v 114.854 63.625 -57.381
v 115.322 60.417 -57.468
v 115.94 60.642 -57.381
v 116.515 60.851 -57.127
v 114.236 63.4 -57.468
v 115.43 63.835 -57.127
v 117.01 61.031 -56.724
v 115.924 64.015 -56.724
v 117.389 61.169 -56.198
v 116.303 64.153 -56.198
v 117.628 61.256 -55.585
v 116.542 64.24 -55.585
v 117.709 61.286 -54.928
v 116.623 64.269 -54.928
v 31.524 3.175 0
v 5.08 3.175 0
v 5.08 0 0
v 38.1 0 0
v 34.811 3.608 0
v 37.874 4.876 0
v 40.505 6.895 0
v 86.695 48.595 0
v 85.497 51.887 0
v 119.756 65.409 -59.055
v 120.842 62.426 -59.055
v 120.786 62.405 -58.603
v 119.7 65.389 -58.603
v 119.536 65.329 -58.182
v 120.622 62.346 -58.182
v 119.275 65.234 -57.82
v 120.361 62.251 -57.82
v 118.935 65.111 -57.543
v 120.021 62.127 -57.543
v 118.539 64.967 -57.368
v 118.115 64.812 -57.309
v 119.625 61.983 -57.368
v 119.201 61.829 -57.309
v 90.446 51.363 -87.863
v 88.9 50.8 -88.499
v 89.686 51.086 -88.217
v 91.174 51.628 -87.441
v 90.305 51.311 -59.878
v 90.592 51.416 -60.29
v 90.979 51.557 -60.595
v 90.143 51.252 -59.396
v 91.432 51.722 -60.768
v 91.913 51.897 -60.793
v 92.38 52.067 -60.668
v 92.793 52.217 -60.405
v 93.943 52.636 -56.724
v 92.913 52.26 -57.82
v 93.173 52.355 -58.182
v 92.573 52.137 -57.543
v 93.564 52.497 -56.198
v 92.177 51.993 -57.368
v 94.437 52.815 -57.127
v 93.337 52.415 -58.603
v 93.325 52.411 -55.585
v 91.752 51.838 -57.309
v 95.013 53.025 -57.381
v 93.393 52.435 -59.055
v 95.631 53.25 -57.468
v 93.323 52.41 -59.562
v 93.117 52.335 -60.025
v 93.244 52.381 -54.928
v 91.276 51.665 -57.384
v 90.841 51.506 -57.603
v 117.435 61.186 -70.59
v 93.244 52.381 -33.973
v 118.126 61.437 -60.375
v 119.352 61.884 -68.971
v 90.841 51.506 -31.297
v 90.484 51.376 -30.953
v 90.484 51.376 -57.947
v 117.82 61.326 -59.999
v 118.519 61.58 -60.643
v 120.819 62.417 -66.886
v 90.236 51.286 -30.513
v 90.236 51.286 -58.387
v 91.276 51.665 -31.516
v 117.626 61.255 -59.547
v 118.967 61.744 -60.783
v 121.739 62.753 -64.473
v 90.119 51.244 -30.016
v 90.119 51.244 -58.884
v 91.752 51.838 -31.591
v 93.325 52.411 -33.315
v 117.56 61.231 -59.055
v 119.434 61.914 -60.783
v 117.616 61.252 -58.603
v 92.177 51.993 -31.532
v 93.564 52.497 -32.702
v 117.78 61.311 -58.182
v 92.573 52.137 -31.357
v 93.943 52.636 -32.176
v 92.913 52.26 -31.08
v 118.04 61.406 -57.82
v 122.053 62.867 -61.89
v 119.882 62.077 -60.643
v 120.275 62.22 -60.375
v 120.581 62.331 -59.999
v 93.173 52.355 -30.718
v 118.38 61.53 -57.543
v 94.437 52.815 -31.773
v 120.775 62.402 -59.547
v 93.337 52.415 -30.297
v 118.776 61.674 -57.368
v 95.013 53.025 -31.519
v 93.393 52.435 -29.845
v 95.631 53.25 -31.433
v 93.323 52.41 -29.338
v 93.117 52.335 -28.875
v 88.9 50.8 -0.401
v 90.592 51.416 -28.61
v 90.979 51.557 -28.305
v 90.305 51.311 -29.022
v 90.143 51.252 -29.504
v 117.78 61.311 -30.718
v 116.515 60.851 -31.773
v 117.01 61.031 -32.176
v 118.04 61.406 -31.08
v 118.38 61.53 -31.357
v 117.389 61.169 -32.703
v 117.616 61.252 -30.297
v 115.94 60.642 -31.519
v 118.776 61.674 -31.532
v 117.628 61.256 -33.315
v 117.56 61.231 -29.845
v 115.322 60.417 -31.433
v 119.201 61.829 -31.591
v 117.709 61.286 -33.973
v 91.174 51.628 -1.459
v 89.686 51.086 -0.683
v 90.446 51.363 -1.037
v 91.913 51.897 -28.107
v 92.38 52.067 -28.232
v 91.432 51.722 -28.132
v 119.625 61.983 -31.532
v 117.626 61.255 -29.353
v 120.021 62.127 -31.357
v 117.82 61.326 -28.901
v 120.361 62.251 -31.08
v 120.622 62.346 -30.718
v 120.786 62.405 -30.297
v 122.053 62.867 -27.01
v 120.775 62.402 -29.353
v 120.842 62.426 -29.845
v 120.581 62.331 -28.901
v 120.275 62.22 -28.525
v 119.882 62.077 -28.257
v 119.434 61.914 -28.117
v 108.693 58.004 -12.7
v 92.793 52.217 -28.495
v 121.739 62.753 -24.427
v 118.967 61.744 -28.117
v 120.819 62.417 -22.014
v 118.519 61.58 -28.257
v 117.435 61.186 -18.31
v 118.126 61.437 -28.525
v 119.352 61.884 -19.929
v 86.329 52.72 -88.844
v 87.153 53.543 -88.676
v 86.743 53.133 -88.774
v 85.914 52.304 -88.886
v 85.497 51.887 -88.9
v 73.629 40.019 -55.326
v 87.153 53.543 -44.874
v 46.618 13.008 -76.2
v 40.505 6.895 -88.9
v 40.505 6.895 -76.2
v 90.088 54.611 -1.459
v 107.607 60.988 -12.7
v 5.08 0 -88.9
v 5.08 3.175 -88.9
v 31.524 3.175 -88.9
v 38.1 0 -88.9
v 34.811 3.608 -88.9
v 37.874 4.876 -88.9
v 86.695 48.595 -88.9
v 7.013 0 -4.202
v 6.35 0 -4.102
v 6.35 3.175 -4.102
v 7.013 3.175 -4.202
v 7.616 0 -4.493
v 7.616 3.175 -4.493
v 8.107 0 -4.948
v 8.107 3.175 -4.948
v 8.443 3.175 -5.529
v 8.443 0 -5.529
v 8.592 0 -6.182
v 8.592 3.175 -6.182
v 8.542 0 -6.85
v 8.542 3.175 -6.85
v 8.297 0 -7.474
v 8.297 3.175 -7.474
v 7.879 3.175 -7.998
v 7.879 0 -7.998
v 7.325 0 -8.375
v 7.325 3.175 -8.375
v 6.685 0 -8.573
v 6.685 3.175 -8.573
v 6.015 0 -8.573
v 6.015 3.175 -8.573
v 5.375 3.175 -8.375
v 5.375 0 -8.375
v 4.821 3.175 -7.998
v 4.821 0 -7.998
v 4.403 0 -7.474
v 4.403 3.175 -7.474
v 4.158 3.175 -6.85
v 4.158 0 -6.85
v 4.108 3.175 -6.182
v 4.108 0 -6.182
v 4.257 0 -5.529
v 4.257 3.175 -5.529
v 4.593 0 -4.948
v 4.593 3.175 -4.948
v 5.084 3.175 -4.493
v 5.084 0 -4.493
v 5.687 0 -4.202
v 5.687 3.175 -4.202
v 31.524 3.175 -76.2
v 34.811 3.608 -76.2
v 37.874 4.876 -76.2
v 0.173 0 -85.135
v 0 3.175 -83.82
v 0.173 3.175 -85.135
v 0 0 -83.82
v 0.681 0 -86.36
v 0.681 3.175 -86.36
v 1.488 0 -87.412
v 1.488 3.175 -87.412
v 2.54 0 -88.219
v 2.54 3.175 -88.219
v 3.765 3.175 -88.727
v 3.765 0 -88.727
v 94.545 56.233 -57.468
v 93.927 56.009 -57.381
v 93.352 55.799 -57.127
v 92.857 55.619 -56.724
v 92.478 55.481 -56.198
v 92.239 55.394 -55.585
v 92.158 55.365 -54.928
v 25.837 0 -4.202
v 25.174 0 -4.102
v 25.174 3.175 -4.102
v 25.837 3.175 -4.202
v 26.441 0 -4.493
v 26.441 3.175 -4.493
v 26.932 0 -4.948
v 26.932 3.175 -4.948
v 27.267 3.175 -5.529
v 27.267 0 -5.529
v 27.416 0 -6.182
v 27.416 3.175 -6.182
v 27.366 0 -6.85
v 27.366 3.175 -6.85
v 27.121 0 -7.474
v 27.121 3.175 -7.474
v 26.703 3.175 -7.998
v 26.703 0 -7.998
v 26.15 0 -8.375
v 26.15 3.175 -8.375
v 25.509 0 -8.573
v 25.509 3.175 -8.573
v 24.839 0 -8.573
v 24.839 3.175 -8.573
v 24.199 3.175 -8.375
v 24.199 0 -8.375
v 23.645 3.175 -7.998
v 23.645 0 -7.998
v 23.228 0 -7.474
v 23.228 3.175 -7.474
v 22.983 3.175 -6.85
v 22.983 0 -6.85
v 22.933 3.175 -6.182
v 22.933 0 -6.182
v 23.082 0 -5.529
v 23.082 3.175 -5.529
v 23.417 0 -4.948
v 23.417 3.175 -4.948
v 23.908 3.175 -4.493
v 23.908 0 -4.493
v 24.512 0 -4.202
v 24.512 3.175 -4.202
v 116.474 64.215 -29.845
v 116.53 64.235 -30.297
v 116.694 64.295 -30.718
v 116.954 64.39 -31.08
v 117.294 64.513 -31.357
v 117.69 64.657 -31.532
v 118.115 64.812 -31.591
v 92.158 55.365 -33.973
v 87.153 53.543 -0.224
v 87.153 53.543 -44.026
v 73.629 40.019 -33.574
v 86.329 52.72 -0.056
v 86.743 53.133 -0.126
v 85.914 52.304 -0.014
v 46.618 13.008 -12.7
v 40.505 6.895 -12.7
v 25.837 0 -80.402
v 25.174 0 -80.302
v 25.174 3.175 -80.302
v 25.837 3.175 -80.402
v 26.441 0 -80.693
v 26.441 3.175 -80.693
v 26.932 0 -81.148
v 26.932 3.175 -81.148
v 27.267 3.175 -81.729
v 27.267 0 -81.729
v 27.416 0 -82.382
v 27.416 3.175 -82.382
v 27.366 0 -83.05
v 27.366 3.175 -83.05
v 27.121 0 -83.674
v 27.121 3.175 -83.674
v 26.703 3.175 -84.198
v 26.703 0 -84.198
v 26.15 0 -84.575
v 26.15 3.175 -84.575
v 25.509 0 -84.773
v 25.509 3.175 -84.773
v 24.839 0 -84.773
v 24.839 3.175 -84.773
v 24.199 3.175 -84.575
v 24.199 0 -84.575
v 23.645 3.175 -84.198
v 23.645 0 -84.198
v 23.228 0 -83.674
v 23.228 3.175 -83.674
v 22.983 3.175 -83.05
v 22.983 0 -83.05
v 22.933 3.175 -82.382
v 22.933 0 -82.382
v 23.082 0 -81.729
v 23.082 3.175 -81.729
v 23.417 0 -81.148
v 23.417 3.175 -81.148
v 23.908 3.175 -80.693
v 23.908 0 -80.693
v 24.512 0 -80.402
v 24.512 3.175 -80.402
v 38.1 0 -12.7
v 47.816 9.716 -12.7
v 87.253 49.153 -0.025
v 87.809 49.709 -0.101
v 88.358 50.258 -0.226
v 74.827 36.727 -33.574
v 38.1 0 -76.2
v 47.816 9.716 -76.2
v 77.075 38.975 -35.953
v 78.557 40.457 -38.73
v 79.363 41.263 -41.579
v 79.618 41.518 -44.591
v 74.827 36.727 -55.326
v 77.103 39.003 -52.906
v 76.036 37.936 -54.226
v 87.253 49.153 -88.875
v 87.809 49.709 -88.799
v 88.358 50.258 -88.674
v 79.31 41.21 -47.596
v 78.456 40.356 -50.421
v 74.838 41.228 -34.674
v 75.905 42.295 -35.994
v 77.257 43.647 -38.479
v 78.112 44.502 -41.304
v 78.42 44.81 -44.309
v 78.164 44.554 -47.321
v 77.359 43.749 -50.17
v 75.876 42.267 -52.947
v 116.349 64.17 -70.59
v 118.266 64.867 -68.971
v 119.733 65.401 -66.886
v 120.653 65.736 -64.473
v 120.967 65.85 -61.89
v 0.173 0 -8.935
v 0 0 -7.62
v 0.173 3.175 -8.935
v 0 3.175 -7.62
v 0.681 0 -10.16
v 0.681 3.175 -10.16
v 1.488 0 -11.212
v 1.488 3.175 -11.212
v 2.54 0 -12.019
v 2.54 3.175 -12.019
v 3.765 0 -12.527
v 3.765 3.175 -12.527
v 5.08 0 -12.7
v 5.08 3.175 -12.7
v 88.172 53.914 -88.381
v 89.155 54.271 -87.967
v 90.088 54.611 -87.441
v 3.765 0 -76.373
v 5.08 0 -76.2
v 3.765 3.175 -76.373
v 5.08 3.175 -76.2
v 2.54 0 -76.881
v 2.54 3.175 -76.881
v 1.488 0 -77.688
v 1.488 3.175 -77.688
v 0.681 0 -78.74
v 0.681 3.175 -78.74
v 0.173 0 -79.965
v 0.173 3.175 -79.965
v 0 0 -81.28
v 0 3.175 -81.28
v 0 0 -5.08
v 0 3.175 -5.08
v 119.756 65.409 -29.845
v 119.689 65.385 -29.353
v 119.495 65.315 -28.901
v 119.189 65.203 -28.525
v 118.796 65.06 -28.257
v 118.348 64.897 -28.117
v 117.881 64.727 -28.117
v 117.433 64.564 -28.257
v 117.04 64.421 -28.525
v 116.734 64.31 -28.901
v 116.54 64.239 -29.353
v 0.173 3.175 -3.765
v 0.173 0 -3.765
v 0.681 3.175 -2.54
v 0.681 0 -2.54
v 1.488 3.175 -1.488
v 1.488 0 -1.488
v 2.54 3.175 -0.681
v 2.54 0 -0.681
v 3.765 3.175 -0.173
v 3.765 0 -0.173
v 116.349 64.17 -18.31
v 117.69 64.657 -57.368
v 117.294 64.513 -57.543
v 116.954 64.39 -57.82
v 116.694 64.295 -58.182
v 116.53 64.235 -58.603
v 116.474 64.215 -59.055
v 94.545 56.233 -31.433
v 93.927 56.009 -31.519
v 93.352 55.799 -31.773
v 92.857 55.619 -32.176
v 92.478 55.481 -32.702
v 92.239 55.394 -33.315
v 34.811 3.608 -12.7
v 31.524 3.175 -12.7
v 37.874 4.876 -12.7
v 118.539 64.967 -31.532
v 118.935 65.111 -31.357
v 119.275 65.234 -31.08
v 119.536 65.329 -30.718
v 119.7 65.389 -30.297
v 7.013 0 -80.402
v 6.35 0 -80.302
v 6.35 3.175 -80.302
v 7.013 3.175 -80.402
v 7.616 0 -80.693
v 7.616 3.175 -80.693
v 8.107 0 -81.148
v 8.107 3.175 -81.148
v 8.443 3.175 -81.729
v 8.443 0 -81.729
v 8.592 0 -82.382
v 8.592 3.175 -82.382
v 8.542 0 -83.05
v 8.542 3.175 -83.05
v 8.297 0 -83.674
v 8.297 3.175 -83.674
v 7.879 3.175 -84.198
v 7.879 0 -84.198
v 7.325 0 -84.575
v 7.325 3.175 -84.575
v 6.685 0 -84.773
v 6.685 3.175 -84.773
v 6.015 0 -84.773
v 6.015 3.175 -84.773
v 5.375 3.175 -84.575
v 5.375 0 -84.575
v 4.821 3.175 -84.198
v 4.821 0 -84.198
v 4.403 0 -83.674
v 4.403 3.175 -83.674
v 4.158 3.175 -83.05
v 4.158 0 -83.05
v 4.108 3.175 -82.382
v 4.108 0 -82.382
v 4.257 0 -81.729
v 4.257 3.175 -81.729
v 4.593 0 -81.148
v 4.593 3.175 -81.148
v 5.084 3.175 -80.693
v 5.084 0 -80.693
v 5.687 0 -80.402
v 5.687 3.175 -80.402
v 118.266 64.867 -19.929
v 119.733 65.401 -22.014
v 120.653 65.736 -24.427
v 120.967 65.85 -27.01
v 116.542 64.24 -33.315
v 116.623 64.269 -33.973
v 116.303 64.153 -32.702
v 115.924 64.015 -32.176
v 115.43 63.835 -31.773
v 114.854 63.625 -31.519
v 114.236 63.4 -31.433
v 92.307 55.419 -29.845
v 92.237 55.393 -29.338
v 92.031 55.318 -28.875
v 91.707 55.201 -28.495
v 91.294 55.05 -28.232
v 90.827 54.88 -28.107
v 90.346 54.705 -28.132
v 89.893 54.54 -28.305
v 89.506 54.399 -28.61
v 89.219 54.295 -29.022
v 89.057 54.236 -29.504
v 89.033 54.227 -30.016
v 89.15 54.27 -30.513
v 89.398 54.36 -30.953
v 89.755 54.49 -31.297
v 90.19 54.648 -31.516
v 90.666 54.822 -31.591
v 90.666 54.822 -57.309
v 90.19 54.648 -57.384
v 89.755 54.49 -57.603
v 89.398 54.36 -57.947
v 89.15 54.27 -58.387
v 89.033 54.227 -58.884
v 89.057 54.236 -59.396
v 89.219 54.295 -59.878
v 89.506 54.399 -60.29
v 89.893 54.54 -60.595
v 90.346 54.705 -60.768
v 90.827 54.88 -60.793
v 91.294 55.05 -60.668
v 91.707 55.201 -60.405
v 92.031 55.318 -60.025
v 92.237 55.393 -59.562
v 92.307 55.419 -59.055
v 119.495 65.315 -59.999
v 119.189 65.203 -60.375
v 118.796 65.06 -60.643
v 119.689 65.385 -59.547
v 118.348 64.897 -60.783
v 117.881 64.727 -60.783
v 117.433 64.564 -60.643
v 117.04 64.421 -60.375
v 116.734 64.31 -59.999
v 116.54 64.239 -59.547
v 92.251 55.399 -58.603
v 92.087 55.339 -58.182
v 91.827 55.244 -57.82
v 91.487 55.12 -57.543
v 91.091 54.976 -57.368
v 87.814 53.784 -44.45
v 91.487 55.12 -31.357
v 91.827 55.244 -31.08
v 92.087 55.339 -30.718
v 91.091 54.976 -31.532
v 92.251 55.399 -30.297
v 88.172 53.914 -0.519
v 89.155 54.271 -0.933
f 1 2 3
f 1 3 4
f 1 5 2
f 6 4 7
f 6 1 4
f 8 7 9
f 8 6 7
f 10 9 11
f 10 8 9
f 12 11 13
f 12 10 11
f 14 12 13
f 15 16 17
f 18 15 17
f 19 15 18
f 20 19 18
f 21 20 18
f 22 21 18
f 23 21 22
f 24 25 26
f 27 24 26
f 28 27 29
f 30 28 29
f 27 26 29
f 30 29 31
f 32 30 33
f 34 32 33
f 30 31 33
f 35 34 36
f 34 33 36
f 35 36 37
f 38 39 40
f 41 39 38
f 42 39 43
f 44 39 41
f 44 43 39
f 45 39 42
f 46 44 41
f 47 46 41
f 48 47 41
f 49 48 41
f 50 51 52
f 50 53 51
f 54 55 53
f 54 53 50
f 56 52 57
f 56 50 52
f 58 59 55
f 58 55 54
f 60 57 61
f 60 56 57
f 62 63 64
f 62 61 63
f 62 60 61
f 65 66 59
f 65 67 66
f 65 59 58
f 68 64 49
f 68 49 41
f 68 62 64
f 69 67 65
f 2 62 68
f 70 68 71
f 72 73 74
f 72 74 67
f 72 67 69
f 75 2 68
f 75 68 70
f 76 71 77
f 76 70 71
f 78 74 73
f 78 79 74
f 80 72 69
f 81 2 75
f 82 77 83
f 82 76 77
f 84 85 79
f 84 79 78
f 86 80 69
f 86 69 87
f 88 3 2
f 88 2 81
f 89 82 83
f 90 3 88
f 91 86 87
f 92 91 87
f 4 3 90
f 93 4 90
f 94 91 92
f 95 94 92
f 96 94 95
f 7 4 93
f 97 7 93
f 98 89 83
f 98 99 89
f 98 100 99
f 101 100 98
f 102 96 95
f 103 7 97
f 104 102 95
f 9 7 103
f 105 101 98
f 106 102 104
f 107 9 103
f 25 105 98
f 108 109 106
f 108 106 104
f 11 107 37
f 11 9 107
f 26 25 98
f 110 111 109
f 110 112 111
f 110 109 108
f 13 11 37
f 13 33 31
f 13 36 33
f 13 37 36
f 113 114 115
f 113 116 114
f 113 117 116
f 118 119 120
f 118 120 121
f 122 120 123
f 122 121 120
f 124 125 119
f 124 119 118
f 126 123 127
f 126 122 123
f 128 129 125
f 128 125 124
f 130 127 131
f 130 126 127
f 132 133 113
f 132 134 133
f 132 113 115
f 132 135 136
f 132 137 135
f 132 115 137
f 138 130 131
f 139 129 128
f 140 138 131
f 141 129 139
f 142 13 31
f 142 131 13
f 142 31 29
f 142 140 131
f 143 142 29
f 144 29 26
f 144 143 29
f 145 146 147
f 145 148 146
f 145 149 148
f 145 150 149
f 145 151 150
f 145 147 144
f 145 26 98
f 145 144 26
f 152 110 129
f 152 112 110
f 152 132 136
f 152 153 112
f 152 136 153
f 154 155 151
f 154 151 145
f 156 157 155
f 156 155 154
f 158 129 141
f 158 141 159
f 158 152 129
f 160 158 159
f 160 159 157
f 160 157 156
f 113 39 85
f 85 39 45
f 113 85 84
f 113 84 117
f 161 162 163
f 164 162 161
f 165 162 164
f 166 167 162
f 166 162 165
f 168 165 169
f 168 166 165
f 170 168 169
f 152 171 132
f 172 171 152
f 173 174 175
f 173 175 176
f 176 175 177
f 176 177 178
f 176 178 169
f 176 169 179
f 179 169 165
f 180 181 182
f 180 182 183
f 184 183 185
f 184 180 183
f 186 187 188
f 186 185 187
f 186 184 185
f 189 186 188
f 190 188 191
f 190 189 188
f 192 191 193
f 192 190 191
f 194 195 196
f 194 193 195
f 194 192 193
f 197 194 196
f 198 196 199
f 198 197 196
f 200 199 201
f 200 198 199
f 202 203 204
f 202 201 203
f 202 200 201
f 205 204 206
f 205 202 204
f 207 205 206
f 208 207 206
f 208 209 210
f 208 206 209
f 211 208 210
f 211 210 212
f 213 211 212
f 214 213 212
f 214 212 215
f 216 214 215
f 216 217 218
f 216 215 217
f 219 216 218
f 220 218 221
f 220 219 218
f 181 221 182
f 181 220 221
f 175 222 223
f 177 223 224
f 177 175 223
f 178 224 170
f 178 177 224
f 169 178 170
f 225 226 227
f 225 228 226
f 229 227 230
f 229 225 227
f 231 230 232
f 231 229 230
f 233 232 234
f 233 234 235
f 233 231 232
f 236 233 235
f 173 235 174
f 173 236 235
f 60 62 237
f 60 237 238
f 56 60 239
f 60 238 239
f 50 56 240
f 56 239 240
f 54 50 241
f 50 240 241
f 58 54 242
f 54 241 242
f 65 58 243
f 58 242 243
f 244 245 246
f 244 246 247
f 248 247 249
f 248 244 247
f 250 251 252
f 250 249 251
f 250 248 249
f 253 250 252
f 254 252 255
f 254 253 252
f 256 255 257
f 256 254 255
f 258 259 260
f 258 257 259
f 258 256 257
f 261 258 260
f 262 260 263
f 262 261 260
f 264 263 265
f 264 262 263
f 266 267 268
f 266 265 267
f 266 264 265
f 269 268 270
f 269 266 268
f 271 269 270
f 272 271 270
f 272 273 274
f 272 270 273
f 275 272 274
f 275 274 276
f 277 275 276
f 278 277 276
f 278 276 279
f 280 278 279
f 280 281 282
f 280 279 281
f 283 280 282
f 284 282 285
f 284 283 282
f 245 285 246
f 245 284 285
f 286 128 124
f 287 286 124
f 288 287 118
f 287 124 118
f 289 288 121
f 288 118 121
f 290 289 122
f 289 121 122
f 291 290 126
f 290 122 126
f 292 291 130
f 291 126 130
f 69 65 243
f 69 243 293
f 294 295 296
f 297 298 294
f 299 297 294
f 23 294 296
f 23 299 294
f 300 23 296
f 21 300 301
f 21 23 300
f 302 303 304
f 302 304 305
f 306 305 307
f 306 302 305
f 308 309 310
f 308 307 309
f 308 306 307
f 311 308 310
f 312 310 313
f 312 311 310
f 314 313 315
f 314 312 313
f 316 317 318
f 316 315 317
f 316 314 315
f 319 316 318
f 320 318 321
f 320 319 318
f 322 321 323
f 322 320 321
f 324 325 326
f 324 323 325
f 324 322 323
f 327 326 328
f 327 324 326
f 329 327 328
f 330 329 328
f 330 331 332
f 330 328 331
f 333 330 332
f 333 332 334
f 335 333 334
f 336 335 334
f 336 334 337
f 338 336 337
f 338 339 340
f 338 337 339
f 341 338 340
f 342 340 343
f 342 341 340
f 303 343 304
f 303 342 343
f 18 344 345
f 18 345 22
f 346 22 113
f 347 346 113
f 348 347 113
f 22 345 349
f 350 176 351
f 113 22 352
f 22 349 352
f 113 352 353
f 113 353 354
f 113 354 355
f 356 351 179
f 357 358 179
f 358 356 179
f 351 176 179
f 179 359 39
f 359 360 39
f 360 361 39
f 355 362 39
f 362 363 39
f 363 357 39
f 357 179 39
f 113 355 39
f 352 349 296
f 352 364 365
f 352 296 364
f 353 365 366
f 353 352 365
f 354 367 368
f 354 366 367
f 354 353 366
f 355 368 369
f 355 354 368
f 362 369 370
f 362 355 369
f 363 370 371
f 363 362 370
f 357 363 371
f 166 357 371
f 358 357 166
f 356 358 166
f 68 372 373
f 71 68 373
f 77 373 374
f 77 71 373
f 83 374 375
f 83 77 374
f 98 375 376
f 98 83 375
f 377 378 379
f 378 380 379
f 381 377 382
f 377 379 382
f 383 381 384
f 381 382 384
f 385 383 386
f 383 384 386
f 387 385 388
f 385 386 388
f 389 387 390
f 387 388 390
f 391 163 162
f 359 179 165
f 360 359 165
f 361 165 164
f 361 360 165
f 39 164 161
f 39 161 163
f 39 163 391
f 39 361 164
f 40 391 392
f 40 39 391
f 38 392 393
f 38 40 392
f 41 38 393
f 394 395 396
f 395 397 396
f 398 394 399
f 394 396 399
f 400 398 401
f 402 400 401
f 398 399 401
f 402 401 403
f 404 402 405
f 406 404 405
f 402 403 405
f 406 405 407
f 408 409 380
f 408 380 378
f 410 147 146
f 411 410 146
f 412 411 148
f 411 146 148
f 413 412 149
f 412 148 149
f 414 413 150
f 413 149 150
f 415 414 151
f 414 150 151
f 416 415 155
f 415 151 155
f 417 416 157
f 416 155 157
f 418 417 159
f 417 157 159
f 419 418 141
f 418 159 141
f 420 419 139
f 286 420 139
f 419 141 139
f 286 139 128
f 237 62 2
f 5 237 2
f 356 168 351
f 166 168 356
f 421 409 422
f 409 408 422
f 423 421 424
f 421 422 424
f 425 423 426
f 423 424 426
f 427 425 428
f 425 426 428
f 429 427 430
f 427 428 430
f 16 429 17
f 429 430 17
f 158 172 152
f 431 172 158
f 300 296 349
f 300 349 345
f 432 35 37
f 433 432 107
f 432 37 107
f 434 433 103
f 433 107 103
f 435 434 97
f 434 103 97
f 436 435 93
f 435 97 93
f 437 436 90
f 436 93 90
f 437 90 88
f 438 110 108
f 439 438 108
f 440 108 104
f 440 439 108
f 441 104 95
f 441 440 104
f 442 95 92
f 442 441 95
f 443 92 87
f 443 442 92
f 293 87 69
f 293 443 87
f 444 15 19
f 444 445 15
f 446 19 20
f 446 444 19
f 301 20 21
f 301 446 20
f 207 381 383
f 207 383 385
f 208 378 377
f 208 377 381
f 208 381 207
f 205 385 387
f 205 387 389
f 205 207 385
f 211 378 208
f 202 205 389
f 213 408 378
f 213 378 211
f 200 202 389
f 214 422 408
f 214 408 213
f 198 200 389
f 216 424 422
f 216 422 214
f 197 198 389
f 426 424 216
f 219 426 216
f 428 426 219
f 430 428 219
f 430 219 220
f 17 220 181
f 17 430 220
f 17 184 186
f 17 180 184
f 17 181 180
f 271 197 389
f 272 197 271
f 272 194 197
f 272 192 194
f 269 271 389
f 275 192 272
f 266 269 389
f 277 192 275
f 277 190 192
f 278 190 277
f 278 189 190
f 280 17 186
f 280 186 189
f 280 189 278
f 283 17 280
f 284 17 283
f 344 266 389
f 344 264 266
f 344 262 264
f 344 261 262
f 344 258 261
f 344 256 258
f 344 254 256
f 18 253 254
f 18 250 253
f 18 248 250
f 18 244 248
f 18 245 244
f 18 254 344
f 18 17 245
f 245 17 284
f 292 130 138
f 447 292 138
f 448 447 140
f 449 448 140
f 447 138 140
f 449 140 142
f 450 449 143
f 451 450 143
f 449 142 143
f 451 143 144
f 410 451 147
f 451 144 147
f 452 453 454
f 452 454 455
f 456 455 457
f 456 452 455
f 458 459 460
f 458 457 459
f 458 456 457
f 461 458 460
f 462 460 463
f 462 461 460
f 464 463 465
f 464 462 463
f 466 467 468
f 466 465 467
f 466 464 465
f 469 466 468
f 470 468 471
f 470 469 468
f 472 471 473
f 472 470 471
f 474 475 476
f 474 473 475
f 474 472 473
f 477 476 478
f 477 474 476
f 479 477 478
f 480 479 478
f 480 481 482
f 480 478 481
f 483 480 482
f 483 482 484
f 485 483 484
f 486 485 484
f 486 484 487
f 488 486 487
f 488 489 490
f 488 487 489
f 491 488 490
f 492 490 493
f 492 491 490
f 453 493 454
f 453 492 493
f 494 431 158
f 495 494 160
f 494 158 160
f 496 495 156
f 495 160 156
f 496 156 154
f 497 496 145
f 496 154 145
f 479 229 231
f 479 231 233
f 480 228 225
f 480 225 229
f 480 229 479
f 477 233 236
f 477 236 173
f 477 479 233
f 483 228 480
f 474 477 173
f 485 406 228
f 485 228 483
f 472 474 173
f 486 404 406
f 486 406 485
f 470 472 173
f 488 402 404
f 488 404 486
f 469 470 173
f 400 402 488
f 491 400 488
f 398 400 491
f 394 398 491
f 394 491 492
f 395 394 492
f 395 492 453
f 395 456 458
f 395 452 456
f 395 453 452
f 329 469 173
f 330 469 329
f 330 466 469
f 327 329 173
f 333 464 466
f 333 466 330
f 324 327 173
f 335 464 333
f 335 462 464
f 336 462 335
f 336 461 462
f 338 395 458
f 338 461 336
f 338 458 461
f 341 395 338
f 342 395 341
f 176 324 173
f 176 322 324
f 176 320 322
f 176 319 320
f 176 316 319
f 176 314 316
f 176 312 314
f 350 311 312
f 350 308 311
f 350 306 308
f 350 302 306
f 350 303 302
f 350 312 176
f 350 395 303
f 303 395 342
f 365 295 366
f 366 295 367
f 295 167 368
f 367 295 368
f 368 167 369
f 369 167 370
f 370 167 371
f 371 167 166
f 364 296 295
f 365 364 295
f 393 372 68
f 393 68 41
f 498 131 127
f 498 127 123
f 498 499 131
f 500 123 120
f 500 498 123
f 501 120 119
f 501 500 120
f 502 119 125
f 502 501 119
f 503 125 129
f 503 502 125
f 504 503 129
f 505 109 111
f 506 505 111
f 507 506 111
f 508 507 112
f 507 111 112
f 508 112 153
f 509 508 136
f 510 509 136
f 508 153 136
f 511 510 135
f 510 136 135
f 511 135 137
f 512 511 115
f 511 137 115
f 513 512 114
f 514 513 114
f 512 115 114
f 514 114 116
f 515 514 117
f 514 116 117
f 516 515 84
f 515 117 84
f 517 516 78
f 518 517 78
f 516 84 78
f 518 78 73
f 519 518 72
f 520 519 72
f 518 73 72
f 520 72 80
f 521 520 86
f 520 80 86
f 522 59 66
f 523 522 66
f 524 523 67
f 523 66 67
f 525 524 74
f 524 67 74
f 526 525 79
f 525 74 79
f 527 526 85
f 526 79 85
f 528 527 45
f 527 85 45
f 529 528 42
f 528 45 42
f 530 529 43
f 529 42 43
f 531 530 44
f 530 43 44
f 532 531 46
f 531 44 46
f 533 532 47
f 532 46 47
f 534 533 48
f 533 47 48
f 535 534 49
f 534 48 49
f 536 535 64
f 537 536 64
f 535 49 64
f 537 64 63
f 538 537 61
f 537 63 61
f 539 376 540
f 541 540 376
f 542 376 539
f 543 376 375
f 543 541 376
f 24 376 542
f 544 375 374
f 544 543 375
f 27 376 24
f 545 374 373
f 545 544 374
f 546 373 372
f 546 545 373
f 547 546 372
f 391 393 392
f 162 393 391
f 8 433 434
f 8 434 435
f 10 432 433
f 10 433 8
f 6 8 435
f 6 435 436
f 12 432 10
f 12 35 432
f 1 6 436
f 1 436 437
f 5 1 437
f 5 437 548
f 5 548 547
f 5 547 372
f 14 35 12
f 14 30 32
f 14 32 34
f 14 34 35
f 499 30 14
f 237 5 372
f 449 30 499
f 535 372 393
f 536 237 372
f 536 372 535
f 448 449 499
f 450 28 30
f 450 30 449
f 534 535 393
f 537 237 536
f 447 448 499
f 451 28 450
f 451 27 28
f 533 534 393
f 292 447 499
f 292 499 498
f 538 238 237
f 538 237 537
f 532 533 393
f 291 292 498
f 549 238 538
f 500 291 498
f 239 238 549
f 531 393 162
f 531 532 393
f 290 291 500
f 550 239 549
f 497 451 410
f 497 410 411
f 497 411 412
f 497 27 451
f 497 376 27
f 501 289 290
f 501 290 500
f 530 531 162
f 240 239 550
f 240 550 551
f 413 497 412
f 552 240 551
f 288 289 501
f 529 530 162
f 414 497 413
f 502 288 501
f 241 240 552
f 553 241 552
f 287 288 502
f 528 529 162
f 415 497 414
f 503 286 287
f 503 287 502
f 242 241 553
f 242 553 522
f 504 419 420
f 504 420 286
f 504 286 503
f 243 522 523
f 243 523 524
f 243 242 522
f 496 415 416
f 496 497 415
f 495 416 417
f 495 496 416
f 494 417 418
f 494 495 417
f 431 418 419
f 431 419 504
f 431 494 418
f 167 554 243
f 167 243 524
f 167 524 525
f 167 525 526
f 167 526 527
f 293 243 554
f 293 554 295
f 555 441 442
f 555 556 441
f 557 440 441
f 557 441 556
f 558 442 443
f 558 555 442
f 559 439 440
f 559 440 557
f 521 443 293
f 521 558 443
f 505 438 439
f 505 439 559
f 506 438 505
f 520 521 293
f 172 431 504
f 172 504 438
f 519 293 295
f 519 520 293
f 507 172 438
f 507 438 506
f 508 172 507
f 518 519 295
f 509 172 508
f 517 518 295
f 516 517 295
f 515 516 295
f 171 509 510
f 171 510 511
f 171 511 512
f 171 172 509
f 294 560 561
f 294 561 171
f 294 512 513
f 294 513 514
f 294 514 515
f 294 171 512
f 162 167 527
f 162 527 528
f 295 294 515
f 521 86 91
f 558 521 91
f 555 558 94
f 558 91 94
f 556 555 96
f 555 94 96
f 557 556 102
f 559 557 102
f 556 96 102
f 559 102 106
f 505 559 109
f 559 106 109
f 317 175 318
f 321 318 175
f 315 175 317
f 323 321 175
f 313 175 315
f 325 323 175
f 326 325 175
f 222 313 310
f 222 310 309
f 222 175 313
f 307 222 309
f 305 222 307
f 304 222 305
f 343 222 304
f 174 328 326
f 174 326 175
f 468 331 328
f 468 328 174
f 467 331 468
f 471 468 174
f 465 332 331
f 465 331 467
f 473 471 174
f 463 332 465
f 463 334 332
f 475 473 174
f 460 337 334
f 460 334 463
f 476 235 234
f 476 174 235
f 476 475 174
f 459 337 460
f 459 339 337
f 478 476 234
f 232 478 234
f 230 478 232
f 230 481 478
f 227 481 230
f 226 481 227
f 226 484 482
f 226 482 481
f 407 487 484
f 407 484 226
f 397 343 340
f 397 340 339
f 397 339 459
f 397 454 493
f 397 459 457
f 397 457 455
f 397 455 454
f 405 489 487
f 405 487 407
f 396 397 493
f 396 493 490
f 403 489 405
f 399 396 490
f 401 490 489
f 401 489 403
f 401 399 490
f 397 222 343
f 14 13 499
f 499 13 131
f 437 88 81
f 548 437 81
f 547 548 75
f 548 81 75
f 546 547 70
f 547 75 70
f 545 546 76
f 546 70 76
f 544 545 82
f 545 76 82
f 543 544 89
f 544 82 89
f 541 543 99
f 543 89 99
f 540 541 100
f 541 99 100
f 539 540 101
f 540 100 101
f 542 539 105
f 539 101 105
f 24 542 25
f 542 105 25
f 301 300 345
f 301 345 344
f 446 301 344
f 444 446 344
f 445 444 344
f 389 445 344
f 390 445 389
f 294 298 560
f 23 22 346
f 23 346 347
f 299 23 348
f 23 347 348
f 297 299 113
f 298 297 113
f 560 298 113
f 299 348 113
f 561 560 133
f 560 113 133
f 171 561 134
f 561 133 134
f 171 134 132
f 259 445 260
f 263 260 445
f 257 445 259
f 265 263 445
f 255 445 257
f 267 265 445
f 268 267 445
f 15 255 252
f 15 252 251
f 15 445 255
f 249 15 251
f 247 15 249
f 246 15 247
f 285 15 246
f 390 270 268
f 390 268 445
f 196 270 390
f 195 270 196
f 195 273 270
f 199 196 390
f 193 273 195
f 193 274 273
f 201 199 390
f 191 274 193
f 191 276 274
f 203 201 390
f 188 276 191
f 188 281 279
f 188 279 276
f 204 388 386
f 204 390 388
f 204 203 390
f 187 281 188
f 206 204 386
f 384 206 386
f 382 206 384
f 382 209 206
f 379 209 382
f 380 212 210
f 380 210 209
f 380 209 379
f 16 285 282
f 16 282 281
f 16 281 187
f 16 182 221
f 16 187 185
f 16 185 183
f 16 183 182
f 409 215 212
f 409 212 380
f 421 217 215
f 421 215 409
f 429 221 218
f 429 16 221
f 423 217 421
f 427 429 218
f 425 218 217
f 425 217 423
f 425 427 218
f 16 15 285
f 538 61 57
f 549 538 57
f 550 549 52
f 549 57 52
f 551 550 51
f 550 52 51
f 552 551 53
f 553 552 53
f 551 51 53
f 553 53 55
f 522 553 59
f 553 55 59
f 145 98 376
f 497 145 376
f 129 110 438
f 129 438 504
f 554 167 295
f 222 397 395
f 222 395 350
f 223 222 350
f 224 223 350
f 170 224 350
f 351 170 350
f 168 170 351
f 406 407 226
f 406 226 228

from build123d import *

# Parameters (mm, degrees)
BOSS_EXTRUDE1_DEPTH     = 88.9
SKETCH3_W               = 26.035
SKETCH3_H               = 26.035
CUT_EXTRUDE2_DEPTH      = 74.93
FILLET1_R               = 2.54
CUT_EXTRUDE3_DEPTH      = 164.520153114
CUT_EXTRUDE3_DEPTH_BACK = 164.520153114
FILLET2_R               = 12.7
FILLET3_R               = 12.7
FILLET4_R               = 10.16
CUT_EXTRUDE4_DEPTH      = 164.487937905
CUT_EXTRUDE4_DEPTH_BACK = 164.487937905
SKETCH5_W               = 1.155605494
SKETCH5_H               = 63.5
FILLET5_R               = 5.08
CUT_EXTRUDE5_DEPTH      = 164.487937905
CUT_EXTRUDE5_DEPTH_BACK = 164.487937905
SKETCH6_R               = 2.2479


with BuildPart() as part:
    # Sketch1 → Boss-Extrude1 (new body)
    with BuildSketch(Plane.XY):
        Polygon((0, 0), (38.1, 0), (88.9, 50.8), (122.052919477, 62.866675869), (120.967005522, 65.85019994), (87.152654683, 53.542782743), (36.784871939, 3.175), (0, 3.175), align=None)
    extrude(amount=-BOSS_EXTRUDE1_DEPTH)

    # Sketch3 → Cut-Extrude2 (cut)
    with BuildSketch(Plane(origin=(-5.927480783, 16.285619605, 0), x_dir=(0.9396926207859088, 0.3420201433256679, 0), z_dir=(0.3420201433256679, -0.9396926207859088, 0))):
        with BuildLine():
            Line((103.948597269, -31.59125), (103.948597269, -29.845))
            Line((103.948597269, -29.845), (105.694847269, -29.845))
            ThreePointArc((105.694847269, -29.845), (102.713812052, -28.610214783), (103.948597269, -31.59125))
        make_face()
        with BuildLine():
            Line((105.694847269, -29.845), (103.948597269, -29.845))
            Line((103.948597269, -29.845), (103.948597269, -31.59125))
            ThreePointArc((103.948597269, -31.59125), (105.183382485, -31.079785217), (105.694847269, -29.845))
        make_face()
        with Locations((118.553597269, -44.45)):
            Rectangle(SKETCH3_W, SKETCH3_H)
        with BuildLine():
            ThreePointArc((134.904847269, -29.845), (133.158597269, -28.09875), (131.412347269, -29.845))
            Line((131.412347269, -29.845), (133.158597269, -29.845))
            Line((133.158597269, -29.845), (133.158597269, -31.59125))
            ThreePointArc((133.158597269, -31.59125), (134.393382485, -31.079785217), (134.904847269, -29.845))
        make_face()
        with BuildLine():
            Line((133.158597269, -29.845), (131.412347269, -29.845))
            ThreePointArc((131.412347269, -29.845), (131.923812052, -31.079785217), (133.158597269, -31.59125))
            Line((133.158597269, -31.59125), (133.158597269, -29.845))
        make_face()
        with BuildLine():
            ThreePointArc((134.904847269, -59.055), (134.393382485, -57.820214783), (133.158597269, -57.30875))
            Line((133.158597269, -57.30875), (133.158597269, -59.055))
            Line((133.158597269, -59.055), (131.412347269, -59.055))
            ThreePointArc((131.412347269, -59.055), (133.158597269, -60.80125), (134.904847269, -59.055))
        make_face()
        with BuildLine():
            Line((133.158597269, -59.055), (133.158597269, -57.30875))
            ThreePointArc((133.158597269, -57.30875), (131.923812052, -57.820214783), (131.412347269, -59.055))
            Line((131.412347269, -59.055), (133.158597269, -59.055))
        make_face()
        with BuildLine():
            ThreePointArc((105.694847269, -59.055), (105.183382485, -57.820214783), (103.948597269, -57.30875))
            Line((103.948597269, -57.30875), (103.948597269, -59.055))
            Line((103.948597269, -59.055), (105.694847269, -59.055))
        make_face()
        with BuildLine():
            Line((103.948597269, -59.055), (103.948597269, -57.30875))
            ThreePointArc((103.948597269, -57.30875), (102.713812052, -60.289785217), (105.694847269, -59.055))
            Line((105.694847269, -59.055), (103.948597269, -59.055))
        make_face()
    extrude(amount=-CUT_EXTRUDE2_DEPTH, mode=Mode.SUBTRACT)

    # Fillet1
    fillet1_edges = [part.edges().sort_by_distance(p)[0] for p in [
        (92.70105407, 53.872852754, -31.4325),
        (117.165951452, 62.777347186, -31.4325),
        (117.165951452, 62.777347186, -57.4675),
        (92.70105407, 53.872852754, -57.4675),
    ]]
    fillet(fillet1_edges, radius=FILLET1_R)

    # Sketch4 → Cut-Extrude3 (cut, two sides: drawn at the far end of the back side and taken through both)
    with BuildSketch(Plane(origin=(-5.927480783, 16.285619605, 0), x_dir=(0.9396926207859088, 0.3420201433256679, 0), z_dir=(0.3420201433256679, -0.9396926207859088, 0)).offset(-CUT_EXTRUDE3_DEPTH_BACK)):
        Polygon((136.193897269, -67.6275), (100.913297269, -88.9), (136.193897269, -88.9), align=None)
        Polygon((48.255685329, -12.7), (35.652386673, -12.7), (35.652386673, -76.2), (48.255685329, -76.2), (100.913297269, -44.45), align=None)
        Polygon((121.976342045, -12.7), (136.193897269, -21.2725), (136.193897269, -12.7), align=None)
        Polygon((100.913297269, 0), (121.976342045, -12.7), (136.193897269, -12.7), (136.193897269, 0), align=None)
    extrude(amount=CUT_EXTRUDE3_DEPTH + CUT_EXTRUDE3_DEPTH_BACK, mode=Mode.SUBTRACT)

    # Fillet2
    # the kernel refuses this fillet: 12.7 mm, written as the material it adds along each edge
    with BuildSketch(Plane(origin=(106.909963983, 1.318030631, -44.45), x_dir=(-0.8047299231694688, -0.2928977386570137, -0.5163532370822017), z_dir=(-0.3420201433256679, 0.9396926207859088, 0))) as fillet2_piece_1_section:
        with BuildLine():
            CenterArc((FILLET2_R * 1.65850746269, FILLET2_R), FILLET2_R, 152.175900406, 117.824099594)
            Line((FILLET2_R * 0.774122735992, FILLET2_R * 1.46675866911), (0, 0))
            Line((0, 0), (FILLET2_R * 1.65850746269, 0))
        make_face()
    fillet2_piece_1 = extrude(amount=55.83261194, mode=Mode.PRIVATE)
    fillet2_piece_1 = split(fillet2_piece_1, bisect_by=Plane(origin=(82.567963605, 44.467963605, -44.45), z_dir=(-0.7071067811865475, 0.7071067811865476, 0)), keep=Keep.TOP, mode=Mode.PRIVATE)
    fillet2_piece_1 = split(fillet2_piece_1, bisect_by=Plane(origin=(80.322899575, 46.713027635, -44.45), z_dir=(0.7071067811865475, -0.7071067811865476, 0)), keep=Keep.TOP, mode=Mode.PRIVATE)
    add(fillet2_piece_1)

    # Fillet3
    fillet3_edges = [part.edges().sort_by_distance(p)[0] for p in [
        (36.784871939, 3.175, -6.35),
        (36.784871939, 3.175, -82.55),
    ]]
    fillet(fillet3_edges, radius=FILLET3_R)

    # Fillet4
    fillet4_edges = [part.edges().sort_by_distance(p)[0] for p in [
        (88.357043022, 52.291762035, -88.9),
        (121.509962499, 64.358437904, -67.6275),
        (121.509962499, 64.358437904, -21.2725),
        (88.357043022, 52.291762035, 0),
    ]]
    fillet(fillet4_edges, radius=FILLET4_R)

    # Sketch5 → Cut-Extrude4 (cut, two sides: drawn at the far end of the back side and taken through both)
    with BuildSketch(Plane(origin=(0, 3.175, 0), x_dir=(1, 0, 0), z_dir=(0, 1, 0)).offset(-CUT_EXTRUDE4_DEPTH_BACK)):
        Polygon((36.784871939, 12.7), (36.784871939, 76.2), (31.524359697, 76.2), (0, 76.2), (0, 12.7), (31.524359697, 12.7), align=None)
        with Locations((37.362674686, 44.45)):
            Rectangle(SKETCH5_W, SKETCH5_H)
    extrude(amount=CUT_EXTRUDE4_DEPTH + CUT_EXTRUDE4_DEPTH_BACK, mode=Mode.SUBTRACT)

    # Fillet5
    fillet5_edges = [part.edges().sort_by_distance(p)[0] for p in [
        (0, 1.5875, 0),
        (0, 1.5875, -12.7),
        (0, 1.5875, -76.2),
        (0, 1.5875, -88.9),
    ]]
    fillet(fillet5_edges, radius=FILLET5_R)

    # Sketch6 → Cut-Extrude5 (cut, two sides: drawn at the far end of the back side and taken through both)
    with BuildSketch(Plane(origin=(0, 3.175, 0), x_dir=(1, 0, 0), z_dir=(0, 1, 0)).offset(-CUT_EXTRUDE5_DEPTH_BACK)):
        with Locations(Location((6.35, 82.55, 0), (0, 0, 270))):
            Circle(SKETCH6_R)
        with Locations(Location((25.174359697, 82.55, 0), (0, 0, 270))):
            Circle(SKETCH6_R)
        with Locations(Location((6.35, 6.35, 0), (0, 0, 270))):
            Circle(SKETCH6_R)
        with Locations(Location((25.174359697, 6.35, 0), (0, 0, 270))):
            Circle(SKETCH6_R)
    extrude(amount=CUT_EXTRUDE5_DEPTH + CUT_EXTRUDE5_DEPTH_BACK, mode=Mode.SUBTRACT)


solid = part.part
